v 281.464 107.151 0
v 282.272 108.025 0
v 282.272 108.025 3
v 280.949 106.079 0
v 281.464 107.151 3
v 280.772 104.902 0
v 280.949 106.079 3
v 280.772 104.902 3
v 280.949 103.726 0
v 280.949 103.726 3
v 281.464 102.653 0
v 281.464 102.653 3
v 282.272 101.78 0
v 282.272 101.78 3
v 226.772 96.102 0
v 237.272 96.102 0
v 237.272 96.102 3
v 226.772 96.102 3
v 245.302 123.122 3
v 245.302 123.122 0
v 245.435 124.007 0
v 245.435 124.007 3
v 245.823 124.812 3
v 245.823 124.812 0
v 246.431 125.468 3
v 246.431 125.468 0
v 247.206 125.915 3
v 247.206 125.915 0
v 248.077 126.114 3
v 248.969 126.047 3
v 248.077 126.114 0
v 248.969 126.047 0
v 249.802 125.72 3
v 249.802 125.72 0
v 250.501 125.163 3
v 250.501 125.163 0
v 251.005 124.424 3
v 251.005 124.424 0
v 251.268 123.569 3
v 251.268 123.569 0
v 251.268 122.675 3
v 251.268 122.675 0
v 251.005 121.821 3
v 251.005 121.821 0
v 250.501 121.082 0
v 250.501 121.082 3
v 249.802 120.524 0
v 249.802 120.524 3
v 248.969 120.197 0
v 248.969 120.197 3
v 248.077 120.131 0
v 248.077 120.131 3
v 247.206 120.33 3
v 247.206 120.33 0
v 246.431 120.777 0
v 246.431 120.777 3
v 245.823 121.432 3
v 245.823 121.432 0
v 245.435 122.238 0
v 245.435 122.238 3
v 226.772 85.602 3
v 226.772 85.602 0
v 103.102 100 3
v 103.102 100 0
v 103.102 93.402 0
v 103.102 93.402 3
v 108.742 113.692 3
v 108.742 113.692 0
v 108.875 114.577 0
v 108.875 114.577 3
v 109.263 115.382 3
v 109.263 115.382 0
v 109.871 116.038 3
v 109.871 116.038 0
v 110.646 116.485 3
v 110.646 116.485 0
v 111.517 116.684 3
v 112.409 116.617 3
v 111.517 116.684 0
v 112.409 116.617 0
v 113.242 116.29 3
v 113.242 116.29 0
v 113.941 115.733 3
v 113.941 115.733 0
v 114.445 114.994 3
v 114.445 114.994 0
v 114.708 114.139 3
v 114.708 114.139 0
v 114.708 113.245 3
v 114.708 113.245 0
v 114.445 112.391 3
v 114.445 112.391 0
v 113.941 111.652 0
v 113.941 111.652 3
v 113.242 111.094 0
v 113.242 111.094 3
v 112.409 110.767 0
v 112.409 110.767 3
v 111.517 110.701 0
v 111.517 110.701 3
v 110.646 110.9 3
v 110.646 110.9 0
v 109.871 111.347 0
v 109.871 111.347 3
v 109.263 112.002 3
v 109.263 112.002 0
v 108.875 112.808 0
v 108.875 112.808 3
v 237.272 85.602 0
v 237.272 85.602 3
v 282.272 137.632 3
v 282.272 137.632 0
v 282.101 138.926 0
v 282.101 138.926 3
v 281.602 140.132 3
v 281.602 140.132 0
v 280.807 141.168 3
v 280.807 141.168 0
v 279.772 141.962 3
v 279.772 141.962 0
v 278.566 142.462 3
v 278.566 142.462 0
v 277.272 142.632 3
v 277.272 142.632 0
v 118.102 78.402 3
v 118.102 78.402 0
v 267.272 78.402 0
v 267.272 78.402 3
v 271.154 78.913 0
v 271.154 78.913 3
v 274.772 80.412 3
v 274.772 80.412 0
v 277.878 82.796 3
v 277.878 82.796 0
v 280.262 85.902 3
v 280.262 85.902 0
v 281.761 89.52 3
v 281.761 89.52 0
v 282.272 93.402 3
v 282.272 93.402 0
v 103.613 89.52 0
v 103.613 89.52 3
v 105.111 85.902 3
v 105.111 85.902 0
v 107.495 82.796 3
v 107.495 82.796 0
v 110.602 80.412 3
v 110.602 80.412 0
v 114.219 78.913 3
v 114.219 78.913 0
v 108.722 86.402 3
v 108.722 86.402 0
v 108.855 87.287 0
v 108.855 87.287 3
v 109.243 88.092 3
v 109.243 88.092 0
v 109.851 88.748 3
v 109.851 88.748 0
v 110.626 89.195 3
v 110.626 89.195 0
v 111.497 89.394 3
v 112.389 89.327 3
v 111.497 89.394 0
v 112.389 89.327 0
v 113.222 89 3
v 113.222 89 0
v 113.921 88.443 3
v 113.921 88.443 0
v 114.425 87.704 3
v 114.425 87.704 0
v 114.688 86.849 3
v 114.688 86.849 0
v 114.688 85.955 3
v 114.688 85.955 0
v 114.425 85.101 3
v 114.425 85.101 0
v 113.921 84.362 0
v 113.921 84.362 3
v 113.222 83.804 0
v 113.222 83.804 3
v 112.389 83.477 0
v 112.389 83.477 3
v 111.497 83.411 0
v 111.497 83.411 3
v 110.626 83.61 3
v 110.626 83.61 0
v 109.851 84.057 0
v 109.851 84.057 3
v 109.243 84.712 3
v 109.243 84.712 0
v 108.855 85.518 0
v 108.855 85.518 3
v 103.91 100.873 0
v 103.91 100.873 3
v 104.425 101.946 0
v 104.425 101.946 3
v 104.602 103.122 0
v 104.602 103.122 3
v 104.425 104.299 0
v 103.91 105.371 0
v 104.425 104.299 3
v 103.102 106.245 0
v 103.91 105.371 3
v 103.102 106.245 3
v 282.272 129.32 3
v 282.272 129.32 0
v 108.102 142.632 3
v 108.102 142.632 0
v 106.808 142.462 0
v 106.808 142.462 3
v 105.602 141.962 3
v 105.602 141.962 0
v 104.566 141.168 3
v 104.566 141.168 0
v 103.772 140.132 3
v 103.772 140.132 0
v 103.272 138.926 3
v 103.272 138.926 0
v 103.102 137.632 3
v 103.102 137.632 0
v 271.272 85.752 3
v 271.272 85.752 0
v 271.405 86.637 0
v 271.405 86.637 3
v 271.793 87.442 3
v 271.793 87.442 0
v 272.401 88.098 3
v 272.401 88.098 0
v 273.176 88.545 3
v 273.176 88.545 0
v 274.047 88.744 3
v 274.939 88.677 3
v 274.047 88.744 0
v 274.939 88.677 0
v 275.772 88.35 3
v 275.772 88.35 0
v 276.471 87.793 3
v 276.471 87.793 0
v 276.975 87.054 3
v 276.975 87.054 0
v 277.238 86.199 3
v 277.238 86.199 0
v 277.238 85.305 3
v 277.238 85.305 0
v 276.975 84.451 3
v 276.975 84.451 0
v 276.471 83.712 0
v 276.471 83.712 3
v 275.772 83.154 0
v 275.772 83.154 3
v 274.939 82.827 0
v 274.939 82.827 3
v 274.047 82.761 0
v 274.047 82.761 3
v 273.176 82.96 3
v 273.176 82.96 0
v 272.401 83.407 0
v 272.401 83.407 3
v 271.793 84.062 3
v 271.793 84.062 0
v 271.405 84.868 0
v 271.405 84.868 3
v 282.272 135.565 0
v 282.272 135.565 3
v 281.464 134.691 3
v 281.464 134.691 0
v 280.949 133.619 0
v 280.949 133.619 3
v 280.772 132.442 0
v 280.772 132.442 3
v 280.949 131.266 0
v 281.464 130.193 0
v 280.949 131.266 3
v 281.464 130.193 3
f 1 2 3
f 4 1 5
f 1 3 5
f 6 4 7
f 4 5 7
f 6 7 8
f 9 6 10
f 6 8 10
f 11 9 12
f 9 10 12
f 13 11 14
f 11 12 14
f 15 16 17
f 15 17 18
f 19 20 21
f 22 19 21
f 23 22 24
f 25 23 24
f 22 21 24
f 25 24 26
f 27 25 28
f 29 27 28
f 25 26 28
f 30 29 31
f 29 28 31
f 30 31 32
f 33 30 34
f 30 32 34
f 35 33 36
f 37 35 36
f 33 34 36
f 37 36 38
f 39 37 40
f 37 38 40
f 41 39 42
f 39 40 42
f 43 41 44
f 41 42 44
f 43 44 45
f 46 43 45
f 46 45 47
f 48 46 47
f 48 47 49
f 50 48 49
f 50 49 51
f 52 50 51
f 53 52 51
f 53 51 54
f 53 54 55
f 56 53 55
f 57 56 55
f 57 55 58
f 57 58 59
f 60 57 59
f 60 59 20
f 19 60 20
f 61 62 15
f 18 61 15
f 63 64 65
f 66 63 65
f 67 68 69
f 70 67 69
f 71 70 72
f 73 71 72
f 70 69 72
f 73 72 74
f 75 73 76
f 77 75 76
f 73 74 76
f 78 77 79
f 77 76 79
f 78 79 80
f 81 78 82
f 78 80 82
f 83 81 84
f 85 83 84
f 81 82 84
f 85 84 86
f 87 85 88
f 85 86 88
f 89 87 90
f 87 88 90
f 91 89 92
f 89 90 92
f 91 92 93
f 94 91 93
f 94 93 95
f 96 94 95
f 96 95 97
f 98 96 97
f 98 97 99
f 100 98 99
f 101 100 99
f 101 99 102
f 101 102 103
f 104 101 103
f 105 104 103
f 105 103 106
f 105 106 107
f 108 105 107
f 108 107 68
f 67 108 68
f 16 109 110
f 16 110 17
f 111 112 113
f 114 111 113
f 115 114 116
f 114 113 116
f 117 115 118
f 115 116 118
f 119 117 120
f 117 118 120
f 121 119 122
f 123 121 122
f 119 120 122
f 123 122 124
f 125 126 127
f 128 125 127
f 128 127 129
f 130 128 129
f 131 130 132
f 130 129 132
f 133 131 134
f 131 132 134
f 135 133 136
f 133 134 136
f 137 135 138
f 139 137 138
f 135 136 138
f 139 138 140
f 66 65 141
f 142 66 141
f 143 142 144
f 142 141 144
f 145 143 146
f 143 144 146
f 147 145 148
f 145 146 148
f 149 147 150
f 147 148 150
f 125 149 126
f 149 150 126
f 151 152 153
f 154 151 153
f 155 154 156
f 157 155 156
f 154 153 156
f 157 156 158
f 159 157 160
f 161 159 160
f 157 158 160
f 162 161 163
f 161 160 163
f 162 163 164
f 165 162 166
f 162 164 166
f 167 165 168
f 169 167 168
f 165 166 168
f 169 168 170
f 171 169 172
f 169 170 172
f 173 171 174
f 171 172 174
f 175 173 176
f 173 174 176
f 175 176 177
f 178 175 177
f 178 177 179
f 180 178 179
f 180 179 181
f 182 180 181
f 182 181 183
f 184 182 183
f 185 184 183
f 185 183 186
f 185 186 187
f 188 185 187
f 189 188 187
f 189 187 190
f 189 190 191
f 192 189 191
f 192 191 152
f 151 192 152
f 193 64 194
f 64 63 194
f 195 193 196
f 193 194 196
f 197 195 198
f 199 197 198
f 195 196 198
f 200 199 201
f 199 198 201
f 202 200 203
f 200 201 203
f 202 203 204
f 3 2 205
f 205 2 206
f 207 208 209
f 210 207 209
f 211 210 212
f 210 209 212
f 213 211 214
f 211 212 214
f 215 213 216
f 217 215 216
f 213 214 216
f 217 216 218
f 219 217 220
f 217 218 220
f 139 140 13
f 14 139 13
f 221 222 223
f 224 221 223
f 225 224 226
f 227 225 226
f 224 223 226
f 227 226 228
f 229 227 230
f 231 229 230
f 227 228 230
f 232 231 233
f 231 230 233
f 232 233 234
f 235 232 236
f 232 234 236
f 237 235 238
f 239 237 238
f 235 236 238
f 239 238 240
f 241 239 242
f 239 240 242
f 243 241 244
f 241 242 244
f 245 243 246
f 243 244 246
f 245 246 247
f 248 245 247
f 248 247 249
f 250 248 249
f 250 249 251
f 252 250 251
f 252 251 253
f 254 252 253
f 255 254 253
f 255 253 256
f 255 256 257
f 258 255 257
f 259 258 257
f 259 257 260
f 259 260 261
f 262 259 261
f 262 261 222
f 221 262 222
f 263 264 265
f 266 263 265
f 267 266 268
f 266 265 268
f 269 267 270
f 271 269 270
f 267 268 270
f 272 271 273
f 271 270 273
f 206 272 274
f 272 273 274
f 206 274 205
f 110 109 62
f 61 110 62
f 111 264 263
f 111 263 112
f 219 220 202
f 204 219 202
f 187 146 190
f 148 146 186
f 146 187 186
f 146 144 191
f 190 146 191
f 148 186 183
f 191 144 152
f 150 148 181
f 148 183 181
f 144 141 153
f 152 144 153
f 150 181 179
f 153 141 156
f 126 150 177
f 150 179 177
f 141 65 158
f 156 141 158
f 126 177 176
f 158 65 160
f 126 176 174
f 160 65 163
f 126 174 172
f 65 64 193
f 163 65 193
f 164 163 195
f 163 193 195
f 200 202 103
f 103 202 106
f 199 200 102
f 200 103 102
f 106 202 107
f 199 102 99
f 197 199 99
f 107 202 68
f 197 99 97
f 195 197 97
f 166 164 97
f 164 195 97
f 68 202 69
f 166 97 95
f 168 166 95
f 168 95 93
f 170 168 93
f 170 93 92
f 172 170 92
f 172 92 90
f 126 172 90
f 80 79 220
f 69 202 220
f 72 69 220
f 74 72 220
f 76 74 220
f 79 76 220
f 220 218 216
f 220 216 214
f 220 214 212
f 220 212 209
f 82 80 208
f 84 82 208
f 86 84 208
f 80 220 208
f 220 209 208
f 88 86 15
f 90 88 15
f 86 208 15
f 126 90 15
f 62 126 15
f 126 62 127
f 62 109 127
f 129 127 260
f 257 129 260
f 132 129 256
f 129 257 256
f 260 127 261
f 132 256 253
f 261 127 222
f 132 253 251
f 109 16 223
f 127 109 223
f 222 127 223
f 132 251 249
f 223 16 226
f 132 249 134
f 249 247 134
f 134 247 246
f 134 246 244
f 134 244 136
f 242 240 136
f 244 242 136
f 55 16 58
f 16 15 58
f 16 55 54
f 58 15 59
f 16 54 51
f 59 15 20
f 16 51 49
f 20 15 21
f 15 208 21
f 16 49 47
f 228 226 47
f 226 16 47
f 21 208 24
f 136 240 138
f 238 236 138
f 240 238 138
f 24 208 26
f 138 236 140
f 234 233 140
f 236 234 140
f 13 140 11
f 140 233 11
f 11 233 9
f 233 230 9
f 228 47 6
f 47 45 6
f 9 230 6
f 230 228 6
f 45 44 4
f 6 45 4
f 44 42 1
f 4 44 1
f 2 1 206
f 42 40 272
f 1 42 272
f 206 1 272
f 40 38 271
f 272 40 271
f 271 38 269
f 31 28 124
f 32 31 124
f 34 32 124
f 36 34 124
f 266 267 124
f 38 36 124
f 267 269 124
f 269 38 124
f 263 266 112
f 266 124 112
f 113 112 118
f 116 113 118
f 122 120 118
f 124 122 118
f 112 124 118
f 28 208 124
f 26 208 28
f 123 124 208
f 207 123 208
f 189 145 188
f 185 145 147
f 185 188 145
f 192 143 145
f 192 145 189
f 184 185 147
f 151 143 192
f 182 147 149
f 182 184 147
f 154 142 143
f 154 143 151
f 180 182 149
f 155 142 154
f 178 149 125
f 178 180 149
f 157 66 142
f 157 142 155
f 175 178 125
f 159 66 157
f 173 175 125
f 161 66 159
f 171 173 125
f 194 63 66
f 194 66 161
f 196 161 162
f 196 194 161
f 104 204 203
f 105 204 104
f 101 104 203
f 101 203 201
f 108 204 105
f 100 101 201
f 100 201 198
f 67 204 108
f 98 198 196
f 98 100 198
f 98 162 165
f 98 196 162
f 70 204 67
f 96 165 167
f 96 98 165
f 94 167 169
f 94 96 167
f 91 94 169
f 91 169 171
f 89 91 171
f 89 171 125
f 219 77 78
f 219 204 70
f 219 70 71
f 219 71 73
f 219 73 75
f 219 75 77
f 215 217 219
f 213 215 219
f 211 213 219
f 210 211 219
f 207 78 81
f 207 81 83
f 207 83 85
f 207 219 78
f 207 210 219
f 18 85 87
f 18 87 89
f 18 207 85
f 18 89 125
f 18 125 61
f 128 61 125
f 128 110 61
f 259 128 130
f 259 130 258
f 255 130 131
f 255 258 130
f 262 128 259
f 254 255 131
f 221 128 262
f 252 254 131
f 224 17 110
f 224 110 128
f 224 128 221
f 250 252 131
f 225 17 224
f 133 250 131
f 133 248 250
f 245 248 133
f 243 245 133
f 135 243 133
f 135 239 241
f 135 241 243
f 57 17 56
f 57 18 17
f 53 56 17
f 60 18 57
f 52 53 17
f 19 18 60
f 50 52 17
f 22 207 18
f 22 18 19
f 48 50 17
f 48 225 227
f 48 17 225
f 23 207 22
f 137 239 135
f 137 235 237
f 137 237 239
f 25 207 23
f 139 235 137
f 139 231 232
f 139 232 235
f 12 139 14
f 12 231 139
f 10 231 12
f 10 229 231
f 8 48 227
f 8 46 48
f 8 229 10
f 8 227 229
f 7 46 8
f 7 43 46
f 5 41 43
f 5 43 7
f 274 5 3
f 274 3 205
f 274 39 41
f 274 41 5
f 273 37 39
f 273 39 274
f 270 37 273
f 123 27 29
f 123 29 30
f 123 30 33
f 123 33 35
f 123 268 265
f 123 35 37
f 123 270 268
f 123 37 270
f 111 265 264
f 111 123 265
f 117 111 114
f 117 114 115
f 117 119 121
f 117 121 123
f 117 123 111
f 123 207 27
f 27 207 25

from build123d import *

# Parameters (mm, degrees)
BOSS_EXTRU_1_DEPTH      = 3
ESQUISSE2_R             = 3
ENL_V_MAT_EXTRU_1_DEPTH = 10
ESQUISSE7_R             = 4
ENL_V_MAT_EXTRU_2_DEPTH = 10
ESQUISSE8_W             = 10.5
ESQUISSE8_H             = 10.5
ENL_V_MAT_EXTRU_3_DEPTH = 10


with BuildPart() as part:
    # Esquisse1 → Boss.-Extru.1 (new body)
    with BuildSketch(Plane.XY):
        with BuildLine():
            Line((118.101682981, 78.402253408), (267.271682981, 78.402253408))
            ThreePointArc((267.271682981, 78.402253408), (277.878284699, 82.795651691), (282.271682981, 93.402253408))
            Line((282.271682981, 93.402253408), (282.271682981, 137.632253408))
            ThreePointArc((282.271682981, 137.632253408), (280.807216887, 141.167787314), (277.271682981, 142.632253408))
            Line((277.271682981, 142.632253408), (108.101682981, 142.632253408))
            ThreePointArc((108.101682981, 142.632253408), (104.566149075, 141.167787314), (103.101682981, 137.632253408))
            Line((103.101682981, 137.632253408), (103.101682981, 93.402253408))
            ThreePointArc((103.101682981, 93.402253408), (107.495081263, 82.795651691), (118.101682981, 78.402253408))
        make_face()
    extrude(amount=BOSS_EXTRU_1_DEPTH)

    # Esquisse2 → Enlèv. mat.-Extru.1 (cut)
    with BuildSketch(Plane(origin=(0, 0, 0), x_dir=(-1, 0, 0), z_dir=(0, 0, -1))):
        with Locations((-111.741682981, 113.692253408)):
            Circle(ESQUISSE2_R)
        with Locations((-111.721682981, 86.402253408)):
            Circle(ESQUISSE2_R)
        with Locations((-248.301682981, 123.122253408)):
            Circle(ESQUISSE2_R)
        with Locations((-274.271682981, 85.752253408)):
            Circle(ESQUISSE2_R)
    extrude(amount=-ENL_V_MAT_EXTRU_1_DEPTH, mode=Mode.SUBTRACT)

    # Esquisse7 → Enlèv. mat.-Extru.2 (cut)
    with BuildSketch(Plane.XY.offset(3)):
        with Locations((100.601682981, 103.122253408)):
            Circle(ESQUISSE7_R)
        with Locations((284.771682981, 104.902253408)):
            Circle(ESQUISSE7_R)
        with Locations((284.771682981, 132.442253408)):
            Circle(ESQUISSE7_R)
    extrude(amount=-ENL_V_MAT_EXTRU_2_DEPTH, mode=Mode.SUBTRACT)

    # Esquisse8 → Enlèv. mat.-Extru.3 (cut)
    with BuildSketch(Plane(origin=(0, 0, 0), x_dir=(-1, 0, 0), z_dir=(0, 0, -1))):
        with Locations((-232.021682981, 90.852253408)):
            Rectangle(ESQUISSE8_W, ESQUISSE8_H)
    extrude(amount=-ENL_V_MAT_EXTRU_3_DEPTH, mode=Mode.SUBTRACT)


solid = part.part
